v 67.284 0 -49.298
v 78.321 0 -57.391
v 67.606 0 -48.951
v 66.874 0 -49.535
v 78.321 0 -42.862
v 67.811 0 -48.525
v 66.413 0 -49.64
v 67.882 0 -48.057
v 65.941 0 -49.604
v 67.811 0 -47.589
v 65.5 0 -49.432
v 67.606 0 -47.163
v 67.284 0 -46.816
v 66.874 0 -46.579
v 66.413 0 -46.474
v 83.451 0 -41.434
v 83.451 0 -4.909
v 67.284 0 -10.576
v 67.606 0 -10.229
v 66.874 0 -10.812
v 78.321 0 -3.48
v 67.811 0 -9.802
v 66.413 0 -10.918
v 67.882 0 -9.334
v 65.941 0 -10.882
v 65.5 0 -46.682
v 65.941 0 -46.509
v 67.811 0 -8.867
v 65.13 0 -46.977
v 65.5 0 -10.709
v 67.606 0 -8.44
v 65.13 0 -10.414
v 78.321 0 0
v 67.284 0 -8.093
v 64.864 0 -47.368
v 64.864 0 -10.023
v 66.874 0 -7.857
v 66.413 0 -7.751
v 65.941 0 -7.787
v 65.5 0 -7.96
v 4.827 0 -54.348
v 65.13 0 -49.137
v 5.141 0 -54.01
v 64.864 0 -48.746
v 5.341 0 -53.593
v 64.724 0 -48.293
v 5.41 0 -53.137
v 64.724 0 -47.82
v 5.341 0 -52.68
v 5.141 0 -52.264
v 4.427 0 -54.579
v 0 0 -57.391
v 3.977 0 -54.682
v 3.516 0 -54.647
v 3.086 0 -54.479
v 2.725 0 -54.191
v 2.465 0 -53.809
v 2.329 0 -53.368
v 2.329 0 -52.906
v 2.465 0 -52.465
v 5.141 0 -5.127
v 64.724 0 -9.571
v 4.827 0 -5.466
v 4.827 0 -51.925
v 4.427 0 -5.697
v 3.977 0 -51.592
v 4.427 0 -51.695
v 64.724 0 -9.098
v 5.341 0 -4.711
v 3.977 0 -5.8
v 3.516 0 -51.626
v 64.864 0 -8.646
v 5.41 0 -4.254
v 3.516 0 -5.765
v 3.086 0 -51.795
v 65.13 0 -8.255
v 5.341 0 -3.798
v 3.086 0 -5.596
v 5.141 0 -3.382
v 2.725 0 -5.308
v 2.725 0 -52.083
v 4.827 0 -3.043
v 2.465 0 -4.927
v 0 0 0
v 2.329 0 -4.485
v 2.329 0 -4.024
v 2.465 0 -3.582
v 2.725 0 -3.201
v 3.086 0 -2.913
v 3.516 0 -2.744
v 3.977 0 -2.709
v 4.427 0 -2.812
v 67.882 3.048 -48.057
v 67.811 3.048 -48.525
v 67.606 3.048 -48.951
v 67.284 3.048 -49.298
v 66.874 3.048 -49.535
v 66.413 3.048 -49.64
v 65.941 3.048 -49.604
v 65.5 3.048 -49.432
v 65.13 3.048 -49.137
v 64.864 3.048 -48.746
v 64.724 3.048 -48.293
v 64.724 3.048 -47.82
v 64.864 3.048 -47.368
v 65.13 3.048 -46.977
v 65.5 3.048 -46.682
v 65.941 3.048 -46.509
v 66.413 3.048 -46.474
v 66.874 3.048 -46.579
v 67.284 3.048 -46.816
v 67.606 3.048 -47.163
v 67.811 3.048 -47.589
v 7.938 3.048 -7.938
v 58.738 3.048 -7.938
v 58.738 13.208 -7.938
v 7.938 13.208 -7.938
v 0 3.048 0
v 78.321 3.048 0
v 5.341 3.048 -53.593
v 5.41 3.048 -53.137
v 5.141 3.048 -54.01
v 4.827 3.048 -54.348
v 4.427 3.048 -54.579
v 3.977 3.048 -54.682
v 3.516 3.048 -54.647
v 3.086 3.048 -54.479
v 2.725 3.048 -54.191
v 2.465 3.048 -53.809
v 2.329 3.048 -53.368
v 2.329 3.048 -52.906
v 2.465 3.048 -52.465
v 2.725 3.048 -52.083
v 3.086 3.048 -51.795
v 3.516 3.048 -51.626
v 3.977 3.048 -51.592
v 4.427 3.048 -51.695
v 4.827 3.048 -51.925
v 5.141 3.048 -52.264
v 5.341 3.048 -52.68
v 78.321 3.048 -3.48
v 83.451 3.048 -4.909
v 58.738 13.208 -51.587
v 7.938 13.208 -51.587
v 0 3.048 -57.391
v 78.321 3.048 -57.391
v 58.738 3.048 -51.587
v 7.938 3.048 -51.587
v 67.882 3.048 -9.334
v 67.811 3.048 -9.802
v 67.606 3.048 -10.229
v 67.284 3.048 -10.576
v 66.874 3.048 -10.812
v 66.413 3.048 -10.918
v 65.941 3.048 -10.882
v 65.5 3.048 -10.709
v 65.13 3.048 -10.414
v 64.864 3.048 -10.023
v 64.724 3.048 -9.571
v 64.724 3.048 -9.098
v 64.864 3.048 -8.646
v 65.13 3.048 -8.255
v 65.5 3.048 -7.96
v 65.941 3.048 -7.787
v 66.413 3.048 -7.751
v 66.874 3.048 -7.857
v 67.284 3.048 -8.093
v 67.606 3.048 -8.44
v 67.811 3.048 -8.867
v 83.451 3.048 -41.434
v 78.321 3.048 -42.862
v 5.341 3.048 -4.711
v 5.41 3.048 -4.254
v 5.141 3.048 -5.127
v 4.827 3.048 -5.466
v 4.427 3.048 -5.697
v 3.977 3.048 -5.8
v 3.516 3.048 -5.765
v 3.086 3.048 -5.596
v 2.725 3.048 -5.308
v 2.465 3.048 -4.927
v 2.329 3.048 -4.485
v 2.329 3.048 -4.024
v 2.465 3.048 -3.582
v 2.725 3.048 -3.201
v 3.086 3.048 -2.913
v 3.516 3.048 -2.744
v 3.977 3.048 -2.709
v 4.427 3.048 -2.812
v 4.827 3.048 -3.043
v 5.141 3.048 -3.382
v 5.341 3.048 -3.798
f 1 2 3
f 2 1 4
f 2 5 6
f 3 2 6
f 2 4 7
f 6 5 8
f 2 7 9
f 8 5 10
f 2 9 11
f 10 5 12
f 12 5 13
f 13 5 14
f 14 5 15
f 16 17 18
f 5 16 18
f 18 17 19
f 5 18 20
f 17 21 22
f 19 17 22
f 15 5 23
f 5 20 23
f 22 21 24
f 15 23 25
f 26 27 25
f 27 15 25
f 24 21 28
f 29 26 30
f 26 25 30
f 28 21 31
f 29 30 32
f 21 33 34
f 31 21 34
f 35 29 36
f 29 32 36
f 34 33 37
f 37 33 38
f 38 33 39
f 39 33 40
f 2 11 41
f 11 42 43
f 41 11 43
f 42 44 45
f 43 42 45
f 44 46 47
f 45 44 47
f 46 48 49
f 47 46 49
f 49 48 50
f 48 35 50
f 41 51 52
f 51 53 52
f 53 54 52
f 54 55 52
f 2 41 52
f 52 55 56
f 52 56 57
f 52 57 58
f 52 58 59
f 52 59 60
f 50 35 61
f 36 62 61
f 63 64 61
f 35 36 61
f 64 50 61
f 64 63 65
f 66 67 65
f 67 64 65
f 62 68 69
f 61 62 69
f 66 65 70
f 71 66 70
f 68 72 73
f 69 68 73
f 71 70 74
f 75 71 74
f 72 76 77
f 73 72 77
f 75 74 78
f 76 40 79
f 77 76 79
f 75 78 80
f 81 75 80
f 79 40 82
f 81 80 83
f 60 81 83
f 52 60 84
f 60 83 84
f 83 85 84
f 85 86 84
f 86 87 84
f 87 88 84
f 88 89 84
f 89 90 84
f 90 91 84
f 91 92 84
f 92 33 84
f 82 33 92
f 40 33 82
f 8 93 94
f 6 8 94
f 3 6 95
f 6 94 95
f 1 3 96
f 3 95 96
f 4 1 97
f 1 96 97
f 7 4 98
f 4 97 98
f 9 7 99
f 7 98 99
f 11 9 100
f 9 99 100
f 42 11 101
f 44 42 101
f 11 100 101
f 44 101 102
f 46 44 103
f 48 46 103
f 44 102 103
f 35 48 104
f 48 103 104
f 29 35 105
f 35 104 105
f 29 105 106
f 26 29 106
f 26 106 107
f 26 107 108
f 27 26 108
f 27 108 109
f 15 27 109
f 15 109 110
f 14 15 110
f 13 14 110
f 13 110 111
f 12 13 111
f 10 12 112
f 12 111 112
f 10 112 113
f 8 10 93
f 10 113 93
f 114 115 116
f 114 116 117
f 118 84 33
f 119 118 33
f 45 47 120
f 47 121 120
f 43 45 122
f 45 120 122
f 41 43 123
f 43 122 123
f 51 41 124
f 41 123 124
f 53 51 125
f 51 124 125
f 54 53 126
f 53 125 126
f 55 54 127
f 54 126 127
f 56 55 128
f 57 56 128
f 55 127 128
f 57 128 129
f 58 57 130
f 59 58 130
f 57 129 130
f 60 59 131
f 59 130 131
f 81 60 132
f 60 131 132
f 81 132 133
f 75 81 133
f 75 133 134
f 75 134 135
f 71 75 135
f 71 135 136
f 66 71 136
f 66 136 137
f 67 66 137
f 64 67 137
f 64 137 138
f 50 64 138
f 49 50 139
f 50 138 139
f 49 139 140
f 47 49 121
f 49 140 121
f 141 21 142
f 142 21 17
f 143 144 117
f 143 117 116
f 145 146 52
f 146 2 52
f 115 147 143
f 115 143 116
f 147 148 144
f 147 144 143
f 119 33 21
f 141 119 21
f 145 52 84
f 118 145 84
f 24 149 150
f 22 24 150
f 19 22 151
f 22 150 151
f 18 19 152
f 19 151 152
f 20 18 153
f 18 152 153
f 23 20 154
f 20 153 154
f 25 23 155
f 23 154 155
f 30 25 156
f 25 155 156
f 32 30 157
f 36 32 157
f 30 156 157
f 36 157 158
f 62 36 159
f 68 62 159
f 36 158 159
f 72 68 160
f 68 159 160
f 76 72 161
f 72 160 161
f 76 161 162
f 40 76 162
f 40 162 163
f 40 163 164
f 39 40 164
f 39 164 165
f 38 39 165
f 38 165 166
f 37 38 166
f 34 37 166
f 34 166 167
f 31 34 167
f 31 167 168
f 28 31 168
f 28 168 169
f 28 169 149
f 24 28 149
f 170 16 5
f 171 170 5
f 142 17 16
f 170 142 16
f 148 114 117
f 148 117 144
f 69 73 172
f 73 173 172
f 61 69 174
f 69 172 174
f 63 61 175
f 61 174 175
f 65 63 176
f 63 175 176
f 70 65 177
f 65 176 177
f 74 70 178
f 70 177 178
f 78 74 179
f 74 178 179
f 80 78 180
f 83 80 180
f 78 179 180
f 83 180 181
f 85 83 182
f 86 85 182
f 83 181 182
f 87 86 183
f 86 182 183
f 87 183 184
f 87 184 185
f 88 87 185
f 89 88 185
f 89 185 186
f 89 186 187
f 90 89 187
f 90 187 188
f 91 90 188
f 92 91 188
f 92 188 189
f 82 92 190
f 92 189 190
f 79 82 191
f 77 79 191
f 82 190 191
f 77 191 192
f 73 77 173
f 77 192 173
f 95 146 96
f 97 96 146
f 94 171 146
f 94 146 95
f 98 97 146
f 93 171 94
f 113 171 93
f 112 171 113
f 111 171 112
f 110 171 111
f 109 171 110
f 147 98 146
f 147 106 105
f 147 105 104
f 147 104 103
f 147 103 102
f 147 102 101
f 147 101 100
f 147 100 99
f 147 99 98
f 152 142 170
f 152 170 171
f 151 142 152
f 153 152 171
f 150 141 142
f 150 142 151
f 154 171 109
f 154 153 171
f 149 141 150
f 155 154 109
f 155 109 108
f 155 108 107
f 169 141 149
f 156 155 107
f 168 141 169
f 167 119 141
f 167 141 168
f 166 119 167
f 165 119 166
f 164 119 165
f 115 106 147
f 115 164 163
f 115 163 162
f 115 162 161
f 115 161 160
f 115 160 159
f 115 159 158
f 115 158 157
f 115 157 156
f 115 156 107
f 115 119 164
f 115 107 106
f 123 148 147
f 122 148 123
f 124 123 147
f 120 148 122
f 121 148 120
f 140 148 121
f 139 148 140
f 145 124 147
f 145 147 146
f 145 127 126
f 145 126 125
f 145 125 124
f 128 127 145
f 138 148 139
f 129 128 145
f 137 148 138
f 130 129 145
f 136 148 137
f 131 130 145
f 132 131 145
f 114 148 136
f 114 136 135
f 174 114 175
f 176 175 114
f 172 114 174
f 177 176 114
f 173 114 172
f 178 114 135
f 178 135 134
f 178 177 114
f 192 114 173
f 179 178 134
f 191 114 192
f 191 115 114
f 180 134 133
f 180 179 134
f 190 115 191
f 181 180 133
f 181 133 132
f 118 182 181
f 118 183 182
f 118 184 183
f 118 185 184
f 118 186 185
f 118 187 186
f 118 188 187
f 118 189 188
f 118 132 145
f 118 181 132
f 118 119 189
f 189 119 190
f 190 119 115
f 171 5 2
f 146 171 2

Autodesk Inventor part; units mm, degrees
ref_plane "YZ Plane" through (0, 0, 0) normal (1, 0, 0) x (0, 1, 0)
ref_plane "XZ Plane" through (0, 0, 0) normal (0, 1, 0) x (-1, 0, 0)
ref_plane "XY Plane" through (0, 0, 0) normal (0, 0, 1) x (1, 0, 0)
sketch "Sketch1" plane through (0, 0, 0) normal (0, 1, 0) x (-1, 0, 0)
  line L0 (0, 0) -> (-78.3209, 0)
  line L1 (-78.3209, 0) -> (-78.3209, -57.3913)
  line L2 (-78.3209, -57.3913) -> (0, -57.3913)
  line L3 (0, -57.3913) -> (0, 0)
  line L4 (-78.3209, -3.4798) -> (-78.3209, -42.8625)
  line L5 (-83.4511, -4.9086) -> (-83.4511, -41.4338)
  line L6 (-78.3209, -3.4798) -> (-83.4511, -4.9086)
  line L7 (-83.4511, -41.4338) -> (-78.3209, -42.8625)
  line L8 (-78.3209, -57.3913) -> (-78.3209, -42.8625)
  dimension "d0" = 78.3209
  dimension "d1" = 57.3913
  dimension "d2" = 39.3827
  dimension "d3" = 36.5252
  dimension "d4" = 14.5288
  dimension "d5" = 5.1303
extrude "Extrusion1" add sketch "Sketch1" along normal blind 3.048
sketch "Sketch2" plane through (0, 3.048, 0) normal (0, 1, 0) x (1, 0, 0)
  line L0 (78.3209, 57.3913) -> (0, 57.3913) projected
  line L1 (0, 57.3913) -> (2.3114, 57.3913)
  line L2 (2.3114, 57.3913) -> (2.3114, 54.6862)
  line L3 (2.3114, 54.6862) -> (0, 54.6862)
  line L4 (0, 54.6862) -> (0, 57.3913)
  line L5 (2.3114, 54.6862) -> (5.4864, 54.6862)
  line L6 (5.4864, 54.6862) -> (5.4864, 51.5874)
  line L7 (5.4864, 51.5874) -> (2.3114, 51.5874)
  line L8 (2.3114, 51.5874) -> (2.3114, 54.6862)
  circle A0 centre (3.8608, 53.1368) radius 1.5494
  line L9 (0, 57.3913) -> (0, 0) projected
  line L10 (0, 28.6957) -> (25.4, 28.6957)
  circle A1 centre (3.8608, 4.2545) radius 1.5494
  line L11 (0, 0) -> (78.3209, 0) projected
  line L12 (78.3209, 0) -> (67.8815, 0)
  line L13 (67.8815, 0) -> (67.8815, 57.3913)
  line L14 (67.8815, 57.3913) -> (78.3209, 57.3913)
  line L15 (78.3209, 57.3913) -> (78.3209, 0)
  line L16 (67.8815, 57.3913) -> (67.8815, 49.6443)
  line L17 (67.8815, 0) -> (67.8815, 7.747)
  line L18 (67.8815, 7.747) -> (64.7065, 7.747)
  line L19 (64.7065, 7.747) -> (64.7065, 10.922)
  line L20 (64.7065, 10.922) -> (67.8815, 10.922)
  line L21 (67.8815, 10.922) -> (67.8815, 7.747)
  line L22 (67.8815, 49.6443) -> (64.7065, 49.6443)
  line L23 (64.7065, 49.6443) -> (64.7065, 46.4693)
  line L24 (64.7065, 46.4693) -> (67.8815, 46.4693)
  line L25 (67.8815, 46.4693) -> (67.8815, 49.6443)
  circle A2 centre (66.294, 9.3345) radius 1.5875
  circle A3 centre (66.294, 48.0568) radius 1.5875
  dimension "d8" = 2.3114
  dimension "d9" = 2.7051
  dimension "d10" = 3.175
  dimension "d11" = 3.0988
  dimension "d12" = 10.4394
  dimension "d13" = 7.747
  dimension "d14" = 7.747
  dimension "d15" = 3.175
  dimension "d16" = 3.175
  dimension "d17" = 3.175
  dimension "d18" = 3.175
extrude "Extrusion2" cut sketch "Sketch2" against normal blind 3.048 contours A3 | A0 | A2 | A1
sketch "Sketch3" plane through (0, 3.048, 0) normal (0, 1, 0) x (1, 0, 0)
  line L0 (7.9375, 51.5874) -> (58.7375, 51.5874)
  line L1 (58.7375, 51.5874) -> (58.7375, 7.9375)
  line L2 (58.7375, 7.9375) -> (7.9375, 7.9375)
  line L3 (7.9375, 7.9375) -> (7.9375, 51.5874)
  point P0 (0, 0)
extrude "Extrusion3" add sketch "Sketch3" along normal blind 10.16
sketch "Sketch4" plane through (0, 0, 0) normal (0, -1, 0) x (1, 0, 0)
  line L0 (78.3209, -57.3913) -> (0, -57.3913) projected
  line L1 (0, 0) -> (78.3209, 0)
  line L2 (78.3209, 0) -> (78.3209, -57.3913)
  line L3 (78.3209, -57.3913) -> (0, -57.3913)
  line L4 (0, -57.3913) -> (0, 0)
  line L5 (0, 0) -> (78.3209, 0) projected
  line L6 (39.1604, 0) -> (39.1604, -57.3913)
  line L7 (78.3209, -28.6957) -> (0, -28.6957)
  line L8 (0, -57.3913) -> (0, 0) projected
sketch "Sketch5" plane through (0, 0, 0) normal (0, -1, 0) x (1, 0, 0)
  line L0 (39.1604, 0) -> (39.1604, -57.3913) projected
  line L1 (78.3209, -28.6957) -> (0, -28.6957) projected
  circle A0 centre (3.8608, -53.1368) radius 1.5494 projected
  line L2 (39.1604, -28.6957) -> (3.8608, -28.6957)
  line L3 (3.8608, -28.6957) -> (3.8608, -53.1368)
  line L4 (3.8608, -53.1368) -> (39.1604, -53.1368)
  line L5 (39.1604, -53.1368) -> (39.1604, -28.6957)
  circle A1 centre (3.8608, -4.2545) radius 1.5494 projected
  line L6 (39.1604, -28.6957) -> (3.8608, -28.6957)
  line L7 (3.8608, -28.6957) -> (3.8608, -4.2545)
  line L8 (3.8608, -4.2545) -> (39.1604, -4.2545)
  line L9 (39.1604, -4.2545) -> (39.1604, -28.6957)
  circle A2 centre (66.294, -9.3345) radius 1.5875 projected
  line L10 (39.1604, -28.6957) -> (66.294, -28.6957)
  line L11 (66.294, -28.6957) -> (66.294, -9.3345)
  line L12 (66.294, -9.3345) -> (39.1604, -9.3345)
  line L13 (39.1604, -9.3345) -> (39.1604, -28.6957)
  circle A3 centre (66.294, -48.0568) radius 1.5875 projected
  line L14 (39.1604, -28.6957) -> (66.294, -28.6957)
  line L15 (66.294, -28.6957) -> (66.294, -48.0568)
  line L16 (66.294, -48.0568) -> (39.1604, -48.0568)
  line L17 (39.1604, -48.0568) -> (39.1604, -28.6957)
  point P0 (0, 0)
  dimension "d23" = 24.4412
  dimension "d24" = 24.4412
  dimension "d25" = 35.2996
  dimension "d26" = 35.2996
  dimension "d27" = 27.1335
  dimension "d28" = 27.1335
  dimension "d29" = 19.3611
  dimension "d30" = 19.3611
properties part number "ProArduino"
